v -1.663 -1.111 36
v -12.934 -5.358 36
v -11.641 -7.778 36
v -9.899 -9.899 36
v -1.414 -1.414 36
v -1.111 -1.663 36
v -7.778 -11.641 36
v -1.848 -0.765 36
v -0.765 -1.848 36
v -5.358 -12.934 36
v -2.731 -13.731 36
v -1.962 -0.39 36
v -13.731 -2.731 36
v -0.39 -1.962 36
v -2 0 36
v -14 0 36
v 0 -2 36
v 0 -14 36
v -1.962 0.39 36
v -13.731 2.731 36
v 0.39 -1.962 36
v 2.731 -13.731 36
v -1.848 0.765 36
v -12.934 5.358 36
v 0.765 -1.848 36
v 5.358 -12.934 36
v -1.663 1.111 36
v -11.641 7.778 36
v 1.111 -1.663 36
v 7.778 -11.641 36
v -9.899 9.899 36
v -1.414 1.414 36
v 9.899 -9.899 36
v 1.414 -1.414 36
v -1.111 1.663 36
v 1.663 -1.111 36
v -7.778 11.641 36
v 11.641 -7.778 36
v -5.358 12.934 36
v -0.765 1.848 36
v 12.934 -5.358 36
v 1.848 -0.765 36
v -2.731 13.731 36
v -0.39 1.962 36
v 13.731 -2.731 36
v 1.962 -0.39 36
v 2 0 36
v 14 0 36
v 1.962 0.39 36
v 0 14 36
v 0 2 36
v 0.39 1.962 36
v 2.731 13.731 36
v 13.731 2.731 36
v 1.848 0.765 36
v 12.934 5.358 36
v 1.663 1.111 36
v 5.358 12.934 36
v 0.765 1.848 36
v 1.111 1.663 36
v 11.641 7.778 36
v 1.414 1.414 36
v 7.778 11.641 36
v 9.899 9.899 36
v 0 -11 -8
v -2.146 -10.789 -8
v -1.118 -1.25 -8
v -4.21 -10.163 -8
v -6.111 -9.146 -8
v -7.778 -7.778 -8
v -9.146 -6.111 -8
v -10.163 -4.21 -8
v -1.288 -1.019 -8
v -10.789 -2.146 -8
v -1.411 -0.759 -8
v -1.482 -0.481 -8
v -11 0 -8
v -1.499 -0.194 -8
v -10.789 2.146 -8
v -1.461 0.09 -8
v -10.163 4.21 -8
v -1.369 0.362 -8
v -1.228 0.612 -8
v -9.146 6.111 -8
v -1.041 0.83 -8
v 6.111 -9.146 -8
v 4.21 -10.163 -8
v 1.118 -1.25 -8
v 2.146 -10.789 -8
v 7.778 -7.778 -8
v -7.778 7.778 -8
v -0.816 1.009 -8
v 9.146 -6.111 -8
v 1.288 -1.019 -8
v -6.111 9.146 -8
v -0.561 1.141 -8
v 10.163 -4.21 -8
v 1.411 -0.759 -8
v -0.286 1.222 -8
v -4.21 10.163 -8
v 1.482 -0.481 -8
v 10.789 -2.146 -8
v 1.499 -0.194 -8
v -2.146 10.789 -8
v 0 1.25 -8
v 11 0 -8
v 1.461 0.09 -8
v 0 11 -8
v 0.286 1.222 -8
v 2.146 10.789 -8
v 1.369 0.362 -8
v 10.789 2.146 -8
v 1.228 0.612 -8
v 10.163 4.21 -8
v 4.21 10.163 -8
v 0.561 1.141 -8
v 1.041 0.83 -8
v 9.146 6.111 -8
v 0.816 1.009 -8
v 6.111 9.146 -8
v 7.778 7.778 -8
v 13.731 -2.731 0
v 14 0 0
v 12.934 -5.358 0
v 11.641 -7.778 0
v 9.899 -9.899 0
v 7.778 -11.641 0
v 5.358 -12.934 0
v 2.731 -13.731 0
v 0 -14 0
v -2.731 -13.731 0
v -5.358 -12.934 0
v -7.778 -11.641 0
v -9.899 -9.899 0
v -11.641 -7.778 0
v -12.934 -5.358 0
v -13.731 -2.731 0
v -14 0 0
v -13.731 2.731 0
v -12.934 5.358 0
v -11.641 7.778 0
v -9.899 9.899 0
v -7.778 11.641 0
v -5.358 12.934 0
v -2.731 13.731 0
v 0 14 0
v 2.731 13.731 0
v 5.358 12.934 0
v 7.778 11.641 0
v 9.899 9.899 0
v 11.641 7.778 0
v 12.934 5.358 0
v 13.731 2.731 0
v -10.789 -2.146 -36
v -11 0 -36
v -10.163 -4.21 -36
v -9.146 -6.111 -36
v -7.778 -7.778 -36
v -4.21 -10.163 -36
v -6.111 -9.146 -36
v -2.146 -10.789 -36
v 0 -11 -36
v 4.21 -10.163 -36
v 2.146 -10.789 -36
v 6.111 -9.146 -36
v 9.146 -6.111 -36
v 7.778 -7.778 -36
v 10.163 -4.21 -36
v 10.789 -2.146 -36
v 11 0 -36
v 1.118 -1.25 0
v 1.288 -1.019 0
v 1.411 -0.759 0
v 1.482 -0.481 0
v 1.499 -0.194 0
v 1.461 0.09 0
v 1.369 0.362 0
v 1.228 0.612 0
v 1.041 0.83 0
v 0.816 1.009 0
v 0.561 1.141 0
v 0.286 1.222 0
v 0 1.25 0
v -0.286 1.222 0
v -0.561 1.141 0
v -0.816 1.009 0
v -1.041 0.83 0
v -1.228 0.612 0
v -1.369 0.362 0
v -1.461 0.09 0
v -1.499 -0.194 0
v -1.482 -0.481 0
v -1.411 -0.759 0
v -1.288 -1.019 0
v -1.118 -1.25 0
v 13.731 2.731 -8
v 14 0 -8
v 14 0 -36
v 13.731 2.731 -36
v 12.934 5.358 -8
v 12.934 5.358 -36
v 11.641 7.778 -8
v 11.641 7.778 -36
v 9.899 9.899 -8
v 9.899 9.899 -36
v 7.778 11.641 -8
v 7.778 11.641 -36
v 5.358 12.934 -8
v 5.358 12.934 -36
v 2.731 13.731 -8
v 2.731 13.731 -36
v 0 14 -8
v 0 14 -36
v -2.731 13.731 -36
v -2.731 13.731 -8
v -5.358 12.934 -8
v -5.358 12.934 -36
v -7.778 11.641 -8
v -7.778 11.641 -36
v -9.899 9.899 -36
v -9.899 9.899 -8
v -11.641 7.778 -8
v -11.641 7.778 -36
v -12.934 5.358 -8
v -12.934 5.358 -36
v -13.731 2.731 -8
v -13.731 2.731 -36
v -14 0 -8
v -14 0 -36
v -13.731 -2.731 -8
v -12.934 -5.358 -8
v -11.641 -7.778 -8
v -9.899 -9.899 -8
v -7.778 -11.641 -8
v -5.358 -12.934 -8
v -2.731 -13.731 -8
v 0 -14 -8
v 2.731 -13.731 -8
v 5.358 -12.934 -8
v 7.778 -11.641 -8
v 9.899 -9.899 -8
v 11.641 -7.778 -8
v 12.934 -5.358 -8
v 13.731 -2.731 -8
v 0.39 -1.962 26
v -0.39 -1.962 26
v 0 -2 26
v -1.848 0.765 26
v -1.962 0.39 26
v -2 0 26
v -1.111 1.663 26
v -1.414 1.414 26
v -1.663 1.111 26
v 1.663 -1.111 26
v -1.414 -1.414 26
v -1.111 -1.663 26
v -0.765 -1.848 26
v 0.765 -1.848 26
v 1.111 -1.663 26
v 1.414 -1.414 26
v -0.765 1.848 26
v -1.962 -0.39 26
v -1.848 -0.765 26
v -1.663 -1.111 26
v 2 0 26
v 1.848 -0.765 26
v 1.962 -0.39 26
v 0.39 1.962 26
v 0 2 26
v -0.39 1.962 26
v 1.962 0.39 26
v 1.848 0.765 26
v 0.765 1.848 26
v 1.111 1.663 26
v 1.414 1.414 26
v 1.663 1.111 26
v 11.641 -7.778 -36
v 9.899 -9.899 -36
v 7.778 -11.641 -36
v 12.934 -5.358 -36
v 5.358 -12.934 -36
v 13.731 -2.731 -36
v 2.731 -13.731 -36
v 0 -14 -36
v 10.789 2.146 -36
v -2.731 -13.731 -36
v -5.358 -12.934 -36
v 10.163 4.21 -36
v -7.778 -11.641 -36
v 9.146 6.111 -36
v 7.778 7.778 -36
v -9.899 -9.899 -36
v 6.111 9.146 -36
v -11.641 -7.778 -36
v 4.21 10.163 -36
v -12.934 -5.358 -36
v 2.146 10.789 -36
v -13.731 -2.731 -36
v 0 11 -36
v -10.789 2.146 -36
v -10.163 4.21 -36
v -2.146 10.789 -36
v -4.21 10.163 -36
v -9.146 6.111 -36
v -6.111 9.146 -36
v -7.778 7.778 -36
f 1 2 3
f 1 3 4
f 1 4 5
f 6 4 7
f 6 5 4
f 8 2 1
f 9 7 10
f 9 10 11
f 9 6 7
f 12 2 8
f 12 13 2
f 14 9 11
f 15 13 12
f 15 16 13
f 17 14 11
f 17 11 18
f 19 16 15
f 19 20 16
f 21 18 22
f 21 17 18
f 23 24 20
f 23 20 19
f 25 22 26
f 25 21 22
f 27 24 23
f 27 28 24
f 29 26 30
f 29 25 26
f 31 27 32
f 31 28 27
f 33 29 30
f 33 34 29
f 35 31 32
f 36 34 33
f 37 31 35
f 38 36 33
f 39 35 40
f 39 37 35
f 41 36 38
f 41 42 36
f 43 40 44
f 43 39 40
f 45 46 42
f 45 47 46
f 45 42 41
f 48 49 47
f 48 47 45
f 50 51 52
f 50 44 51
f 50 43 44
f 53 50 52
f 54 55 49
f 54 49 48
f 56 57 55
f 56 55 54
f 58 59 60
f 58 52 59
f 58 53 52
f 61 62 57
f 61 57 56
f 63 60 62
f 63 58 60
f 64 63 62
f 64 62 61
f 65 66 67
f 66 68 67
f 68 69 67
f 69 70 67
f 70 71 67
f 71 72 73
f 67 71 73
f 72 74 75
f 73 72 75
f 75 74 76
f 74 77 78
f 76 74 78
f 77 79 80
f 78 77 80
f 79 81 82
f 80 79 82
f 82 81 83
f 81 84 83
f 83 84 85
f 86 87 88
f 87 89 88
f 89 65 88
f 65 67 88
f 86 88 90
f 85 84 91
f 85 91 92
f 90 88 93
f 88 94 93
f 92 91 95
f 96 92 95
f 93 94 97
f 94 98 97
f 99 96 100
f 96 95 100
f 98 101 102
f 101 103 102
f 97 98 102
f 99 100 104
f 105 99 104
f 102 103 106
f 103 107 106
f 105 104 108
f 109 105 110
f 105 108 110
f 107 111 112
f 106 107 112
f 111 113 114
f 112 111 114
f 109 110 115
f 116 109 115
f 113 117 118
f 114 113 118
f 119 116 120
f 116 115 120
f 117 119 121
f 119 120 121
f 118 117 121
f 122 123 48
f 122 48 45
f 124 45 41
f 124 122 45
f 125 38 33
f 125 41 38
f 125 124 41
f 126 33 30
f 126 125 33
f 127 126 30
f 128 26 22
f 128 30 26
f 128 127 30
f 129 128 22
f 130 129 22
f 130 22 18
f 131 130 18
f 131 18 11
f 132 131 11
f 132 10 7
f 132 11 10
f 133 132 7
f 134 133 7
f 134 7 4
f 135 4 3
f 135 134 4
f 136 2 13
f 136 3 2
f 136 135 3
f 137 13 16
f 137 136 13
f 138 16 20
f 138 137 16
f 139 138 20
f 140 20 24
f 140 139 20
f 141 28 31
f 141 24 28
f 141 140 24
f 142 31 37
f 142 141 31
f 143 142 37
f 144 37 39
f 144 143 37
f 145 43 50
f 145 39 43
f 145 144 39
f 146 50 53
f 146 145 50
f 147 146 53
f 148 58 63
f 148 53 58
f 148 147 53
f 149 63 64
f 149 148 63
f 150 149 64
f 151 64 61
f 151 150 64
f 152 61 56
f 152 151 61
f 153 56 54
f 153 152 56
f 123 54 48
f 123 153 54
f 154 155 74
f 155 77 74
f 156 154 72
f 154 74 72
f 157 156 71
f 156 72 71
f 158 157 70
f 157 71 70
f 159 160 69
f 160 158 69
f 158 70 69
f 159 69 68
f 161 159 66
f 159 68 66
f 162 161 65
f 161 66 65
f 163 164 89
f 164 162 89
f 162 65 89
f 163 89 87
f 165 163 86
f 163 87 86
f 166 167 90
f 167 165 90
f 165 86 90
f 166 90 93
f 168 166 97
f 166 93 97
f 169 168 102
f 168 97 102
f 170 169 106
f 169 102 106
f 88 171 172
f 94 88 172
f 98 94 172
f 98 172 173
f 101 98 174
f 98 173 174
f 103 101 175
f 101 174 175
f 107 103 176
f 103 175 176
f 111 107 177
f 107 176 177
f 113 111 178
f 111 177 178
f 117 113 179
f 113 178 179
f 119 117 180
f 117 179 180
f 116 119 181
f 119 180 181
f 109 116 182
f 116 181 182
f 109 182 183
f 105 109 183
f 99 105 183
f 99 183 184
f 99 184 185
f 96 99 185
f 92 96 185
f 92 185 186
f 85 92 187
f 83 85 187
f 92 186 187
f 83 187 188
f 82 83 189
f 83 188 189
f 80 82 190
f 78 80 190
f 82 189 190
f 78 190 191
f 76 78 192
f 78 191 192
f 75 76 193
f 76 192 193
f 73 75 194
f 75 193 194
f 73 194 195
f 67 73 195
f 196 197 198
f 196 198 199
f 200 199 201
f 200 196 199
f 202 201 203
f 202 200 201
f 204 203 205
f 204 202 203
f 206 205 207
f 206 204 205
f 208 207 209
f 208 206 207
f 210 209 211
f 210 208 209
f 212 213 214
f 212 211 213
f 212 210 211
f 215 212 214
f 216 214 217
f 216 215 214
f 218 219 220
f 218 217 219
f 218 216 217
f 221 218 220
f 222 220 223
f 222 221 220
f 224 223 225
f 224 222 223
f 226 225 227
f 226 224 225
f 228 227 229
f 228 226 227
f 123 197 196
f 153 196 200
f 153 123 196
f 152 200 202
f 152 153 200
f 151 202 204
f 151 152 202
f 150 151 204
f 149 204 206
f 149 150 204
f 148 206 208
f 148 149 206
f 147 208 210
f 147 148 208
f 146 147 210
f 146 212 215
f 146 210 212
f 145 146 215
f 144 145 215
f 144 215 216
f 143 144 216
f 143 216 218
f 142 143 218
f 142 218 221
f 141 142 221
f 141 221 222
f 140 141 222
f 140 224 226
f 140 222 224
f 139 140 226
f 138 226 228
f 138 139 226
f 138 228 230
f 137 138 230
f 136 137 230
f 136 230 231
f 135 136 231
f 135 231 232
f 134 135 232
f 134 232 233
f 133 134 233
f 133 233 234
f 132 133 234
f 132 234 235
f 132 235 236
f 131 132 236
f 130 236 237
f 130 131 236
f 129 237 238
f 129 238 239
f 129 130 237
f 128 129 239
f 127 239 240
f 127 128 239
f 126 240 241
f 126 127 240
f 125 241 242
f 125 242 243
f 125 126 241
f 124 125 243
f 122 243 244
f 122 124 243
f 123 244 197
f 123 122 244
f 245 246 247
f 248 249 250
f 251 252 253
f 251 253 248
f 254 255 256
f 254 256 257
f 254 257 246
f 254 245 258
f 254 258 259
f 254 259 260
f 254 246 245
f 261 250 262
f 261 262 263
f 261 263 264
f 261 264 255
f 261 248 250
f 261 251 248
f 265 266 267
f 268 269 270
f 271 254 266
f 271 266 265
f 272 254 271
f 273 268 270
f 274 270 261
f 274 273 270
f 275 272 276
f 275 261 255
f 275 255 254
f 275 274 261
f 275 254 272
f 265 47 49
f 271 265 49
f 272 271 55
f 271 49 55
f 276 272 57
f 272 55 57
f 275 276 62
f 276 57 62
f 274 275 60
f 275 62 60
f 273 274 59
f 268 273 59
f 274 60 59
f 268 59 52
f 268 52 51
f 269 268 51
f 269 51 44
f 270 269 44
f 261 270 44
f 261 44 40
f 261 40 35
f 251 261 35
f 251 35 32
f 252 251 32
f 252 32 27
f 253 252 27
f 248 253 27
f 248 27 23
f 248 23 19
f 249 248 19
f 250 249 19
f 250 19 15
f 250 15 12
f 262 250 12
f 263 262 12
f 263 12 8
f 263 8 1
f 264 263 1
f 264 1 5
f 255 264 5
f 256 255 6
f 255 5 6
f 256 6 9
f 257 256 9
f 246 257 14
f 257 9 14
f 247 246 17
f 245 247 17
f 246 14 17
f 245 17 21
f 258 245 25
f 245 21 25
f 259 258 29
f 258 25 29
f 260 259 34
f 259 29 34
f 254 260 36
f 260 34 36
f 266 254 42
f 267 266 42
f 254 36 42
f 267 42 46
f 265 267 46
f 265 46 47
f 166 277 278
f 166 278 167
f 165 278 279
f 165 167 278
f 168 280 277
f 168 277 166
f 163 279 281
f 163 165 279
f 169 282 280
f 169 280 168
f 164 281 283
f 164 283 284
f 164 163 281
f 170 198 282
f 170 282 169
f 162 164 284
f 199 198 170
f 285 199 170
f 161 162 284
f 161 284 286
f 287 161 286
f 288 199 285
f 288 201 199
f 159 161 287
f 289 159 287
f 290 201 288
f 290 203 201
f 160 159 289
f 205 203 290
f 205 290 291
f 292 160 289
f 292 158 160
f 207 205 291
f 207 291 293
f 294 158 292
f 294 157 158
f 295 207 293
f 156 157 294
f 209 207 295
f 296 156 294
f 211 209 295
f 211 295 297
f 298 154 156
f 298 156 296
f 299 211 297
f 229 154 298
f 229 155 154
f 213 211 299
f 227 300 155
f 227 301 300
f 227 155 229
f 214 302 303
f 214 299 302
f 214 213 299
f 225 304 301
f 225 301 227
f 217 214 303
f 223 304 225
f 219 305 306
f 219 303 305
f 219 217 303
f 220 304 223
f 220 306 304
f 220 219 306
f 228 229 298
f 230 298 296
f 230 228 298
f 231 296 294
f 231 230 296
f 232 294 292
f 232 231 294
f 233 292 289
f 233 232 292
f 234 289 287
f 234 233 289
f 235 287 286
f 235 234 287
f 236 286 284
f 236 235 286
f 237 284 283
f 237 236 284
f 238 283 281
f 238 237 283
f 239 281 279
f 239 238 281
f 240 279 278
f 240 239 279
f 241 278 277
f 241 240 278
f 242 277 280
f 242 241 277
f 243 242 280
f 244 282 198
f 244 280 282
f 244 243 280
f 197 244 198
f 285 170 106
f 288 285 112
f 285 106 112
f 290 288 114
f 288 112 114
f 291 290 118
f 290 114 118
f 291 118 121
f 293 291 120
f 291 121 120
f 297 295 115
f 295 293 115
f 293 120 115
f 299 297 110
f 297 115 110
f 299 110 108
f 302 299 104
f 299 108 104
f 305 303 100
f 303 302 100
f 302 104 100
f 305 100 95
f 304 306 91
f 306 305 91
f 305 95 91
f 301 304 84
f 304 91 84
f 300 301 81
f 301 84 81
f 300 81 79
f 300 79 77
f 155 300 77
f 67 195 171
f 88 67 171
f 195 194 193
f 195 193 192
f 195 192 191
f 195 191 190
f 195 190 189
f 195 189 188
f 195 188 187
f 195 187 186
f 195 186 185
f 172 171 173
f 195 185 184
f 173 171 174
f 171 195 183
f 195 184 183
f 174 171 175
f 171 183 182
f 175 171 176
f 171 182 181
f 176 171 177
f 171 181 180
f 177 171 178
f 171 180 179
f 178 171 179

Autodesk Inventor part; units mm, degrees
ref_plane "YZ Plane" through (0, 0, 0) normal (1, 0, 0) x (0, 1, 0)
ref_plane "XZ Plane" through (0, 0, 0) normal (0, 1, 0) x (-1, 0, 0)
ref_plane "XY Plane" through (0, 0, 0) normal (0, 0, 1) x (1, 0, 0)
sketch "Sketch1" plane through (0, 0, 0) normal (0, 0, 1) x (1, 0, 0)
  line L0 (-1.118, -1.25) -> (1.118, -1.25) projected
  arc A0 (1.118, -1.25) -> (-1.118, -1.25) centre (0, -0.25) ccw projected
  circle A1 centre (-0.0155, -0.3768) radius 13 projected
  line L1 (7.9845, 2.6232) -> (7.9845, -0.3768) projected
  arc A2 (3.9845, -7.3768) -> (7.9845, -3.3768) centre (3.9845, -3.3768) ccw projected
  line L2 (3.9845, -7.3768) -> (-4.0155, -7.3768) projected
  arc A3 (-8.0155, -3.3768) -> (-4.0155, -7.3768) centre (-4.0155, -3.3768) ccw projected
  line L3 (-8.0155, -3.3768) -> (-8.0155, 2.6232) projected
  arc A4 (-6.0155, 6.0873) -> (-8.0155, 2.6232) centre (-4.0155, 2.6232) ccw projected
  line L4 (-6.0155, 6.0873) -> (-6.0155, -0.3768) projected
  arc A5 (-6.0155, -0.3768) -> (-3.3321, -5.3768) centre (-0.0155, -0.3768) ccw projected
  line L5 (-3.3321, -5.3768) -> (3.3011, -5.3768) projected
  arc A6 (3.3011, -5.3768) -> (5.9845, -0.3768) centre (-0.0155, -0.3768) ccw projected
  line L6 (5.9845, -0.3768) -> (5.9845, 6.0873) projected
  arc A7 (7.9845, 2.6232) -> (5.9845, 6.0873) centre (3.9845, 2.6232) ccw projected
  circle A8 centre (0, 0) radius 11
  line L7 (0, 11) -> (0, 14)
  circle A9 centre (0, 0) radius 14
  circle A10 centre (9.4845, -0.3768) radius 1.5 projected
  line L8 (7.9845, -0.3768) -> (7.9845, -3.3768) projected
  dimension "d0" = 22
  dimension "d1" = 3
extrude "Extrusion1" add sketch "Sketch1" against normal blind 8 contours A8 | A1 | A9 | A10 | L1 L8 A2 L2 A3 L3 A4 L4 A5 L5 A6 L6 A7
sketch "Sketch2" plane through (0, 0, -8) normal (0, 0, -1) x (-1, 0, 0)
  circle A0 centre (0, 0) radius 14 projected
  arc A1 (1.118, -1.25) -> (-1.118, -1.25) centre (0, -0.25) ccw projected
  line L0 (1.118, -1.25) -> (-1.118, -1.25) projected
  circle A2 centre (0, 0) radius 14 projected
  line L1 (-14, 0) -> (-11, 0)
  circle A3 centre (0, 0) radius 11
  dimension "d4" = 3
extrude "Extrusion2" add sketch "Sketch2" along normal blind 28 contours A0
sketch "Sketch3" plane through (0, 0, 0) normal (0, 0, 1) x (1, 0, 0)
  circle A0 centre (0, 0) radius 14 projected
extrude "Extrusion3" add sketch "Sketch3" along normal blind 36
sketch "Sketch4" plane through (0, 0, 36) normal (0, 0, 1) x (1, 0, 0)
  circle A0 centre (0, 0) radius 2 projected
  point P0 (0, 0)
extrude "Extrusion4" cut sketch "Sketch4" against normal blind 10
properties material "Silicon Nitride"
